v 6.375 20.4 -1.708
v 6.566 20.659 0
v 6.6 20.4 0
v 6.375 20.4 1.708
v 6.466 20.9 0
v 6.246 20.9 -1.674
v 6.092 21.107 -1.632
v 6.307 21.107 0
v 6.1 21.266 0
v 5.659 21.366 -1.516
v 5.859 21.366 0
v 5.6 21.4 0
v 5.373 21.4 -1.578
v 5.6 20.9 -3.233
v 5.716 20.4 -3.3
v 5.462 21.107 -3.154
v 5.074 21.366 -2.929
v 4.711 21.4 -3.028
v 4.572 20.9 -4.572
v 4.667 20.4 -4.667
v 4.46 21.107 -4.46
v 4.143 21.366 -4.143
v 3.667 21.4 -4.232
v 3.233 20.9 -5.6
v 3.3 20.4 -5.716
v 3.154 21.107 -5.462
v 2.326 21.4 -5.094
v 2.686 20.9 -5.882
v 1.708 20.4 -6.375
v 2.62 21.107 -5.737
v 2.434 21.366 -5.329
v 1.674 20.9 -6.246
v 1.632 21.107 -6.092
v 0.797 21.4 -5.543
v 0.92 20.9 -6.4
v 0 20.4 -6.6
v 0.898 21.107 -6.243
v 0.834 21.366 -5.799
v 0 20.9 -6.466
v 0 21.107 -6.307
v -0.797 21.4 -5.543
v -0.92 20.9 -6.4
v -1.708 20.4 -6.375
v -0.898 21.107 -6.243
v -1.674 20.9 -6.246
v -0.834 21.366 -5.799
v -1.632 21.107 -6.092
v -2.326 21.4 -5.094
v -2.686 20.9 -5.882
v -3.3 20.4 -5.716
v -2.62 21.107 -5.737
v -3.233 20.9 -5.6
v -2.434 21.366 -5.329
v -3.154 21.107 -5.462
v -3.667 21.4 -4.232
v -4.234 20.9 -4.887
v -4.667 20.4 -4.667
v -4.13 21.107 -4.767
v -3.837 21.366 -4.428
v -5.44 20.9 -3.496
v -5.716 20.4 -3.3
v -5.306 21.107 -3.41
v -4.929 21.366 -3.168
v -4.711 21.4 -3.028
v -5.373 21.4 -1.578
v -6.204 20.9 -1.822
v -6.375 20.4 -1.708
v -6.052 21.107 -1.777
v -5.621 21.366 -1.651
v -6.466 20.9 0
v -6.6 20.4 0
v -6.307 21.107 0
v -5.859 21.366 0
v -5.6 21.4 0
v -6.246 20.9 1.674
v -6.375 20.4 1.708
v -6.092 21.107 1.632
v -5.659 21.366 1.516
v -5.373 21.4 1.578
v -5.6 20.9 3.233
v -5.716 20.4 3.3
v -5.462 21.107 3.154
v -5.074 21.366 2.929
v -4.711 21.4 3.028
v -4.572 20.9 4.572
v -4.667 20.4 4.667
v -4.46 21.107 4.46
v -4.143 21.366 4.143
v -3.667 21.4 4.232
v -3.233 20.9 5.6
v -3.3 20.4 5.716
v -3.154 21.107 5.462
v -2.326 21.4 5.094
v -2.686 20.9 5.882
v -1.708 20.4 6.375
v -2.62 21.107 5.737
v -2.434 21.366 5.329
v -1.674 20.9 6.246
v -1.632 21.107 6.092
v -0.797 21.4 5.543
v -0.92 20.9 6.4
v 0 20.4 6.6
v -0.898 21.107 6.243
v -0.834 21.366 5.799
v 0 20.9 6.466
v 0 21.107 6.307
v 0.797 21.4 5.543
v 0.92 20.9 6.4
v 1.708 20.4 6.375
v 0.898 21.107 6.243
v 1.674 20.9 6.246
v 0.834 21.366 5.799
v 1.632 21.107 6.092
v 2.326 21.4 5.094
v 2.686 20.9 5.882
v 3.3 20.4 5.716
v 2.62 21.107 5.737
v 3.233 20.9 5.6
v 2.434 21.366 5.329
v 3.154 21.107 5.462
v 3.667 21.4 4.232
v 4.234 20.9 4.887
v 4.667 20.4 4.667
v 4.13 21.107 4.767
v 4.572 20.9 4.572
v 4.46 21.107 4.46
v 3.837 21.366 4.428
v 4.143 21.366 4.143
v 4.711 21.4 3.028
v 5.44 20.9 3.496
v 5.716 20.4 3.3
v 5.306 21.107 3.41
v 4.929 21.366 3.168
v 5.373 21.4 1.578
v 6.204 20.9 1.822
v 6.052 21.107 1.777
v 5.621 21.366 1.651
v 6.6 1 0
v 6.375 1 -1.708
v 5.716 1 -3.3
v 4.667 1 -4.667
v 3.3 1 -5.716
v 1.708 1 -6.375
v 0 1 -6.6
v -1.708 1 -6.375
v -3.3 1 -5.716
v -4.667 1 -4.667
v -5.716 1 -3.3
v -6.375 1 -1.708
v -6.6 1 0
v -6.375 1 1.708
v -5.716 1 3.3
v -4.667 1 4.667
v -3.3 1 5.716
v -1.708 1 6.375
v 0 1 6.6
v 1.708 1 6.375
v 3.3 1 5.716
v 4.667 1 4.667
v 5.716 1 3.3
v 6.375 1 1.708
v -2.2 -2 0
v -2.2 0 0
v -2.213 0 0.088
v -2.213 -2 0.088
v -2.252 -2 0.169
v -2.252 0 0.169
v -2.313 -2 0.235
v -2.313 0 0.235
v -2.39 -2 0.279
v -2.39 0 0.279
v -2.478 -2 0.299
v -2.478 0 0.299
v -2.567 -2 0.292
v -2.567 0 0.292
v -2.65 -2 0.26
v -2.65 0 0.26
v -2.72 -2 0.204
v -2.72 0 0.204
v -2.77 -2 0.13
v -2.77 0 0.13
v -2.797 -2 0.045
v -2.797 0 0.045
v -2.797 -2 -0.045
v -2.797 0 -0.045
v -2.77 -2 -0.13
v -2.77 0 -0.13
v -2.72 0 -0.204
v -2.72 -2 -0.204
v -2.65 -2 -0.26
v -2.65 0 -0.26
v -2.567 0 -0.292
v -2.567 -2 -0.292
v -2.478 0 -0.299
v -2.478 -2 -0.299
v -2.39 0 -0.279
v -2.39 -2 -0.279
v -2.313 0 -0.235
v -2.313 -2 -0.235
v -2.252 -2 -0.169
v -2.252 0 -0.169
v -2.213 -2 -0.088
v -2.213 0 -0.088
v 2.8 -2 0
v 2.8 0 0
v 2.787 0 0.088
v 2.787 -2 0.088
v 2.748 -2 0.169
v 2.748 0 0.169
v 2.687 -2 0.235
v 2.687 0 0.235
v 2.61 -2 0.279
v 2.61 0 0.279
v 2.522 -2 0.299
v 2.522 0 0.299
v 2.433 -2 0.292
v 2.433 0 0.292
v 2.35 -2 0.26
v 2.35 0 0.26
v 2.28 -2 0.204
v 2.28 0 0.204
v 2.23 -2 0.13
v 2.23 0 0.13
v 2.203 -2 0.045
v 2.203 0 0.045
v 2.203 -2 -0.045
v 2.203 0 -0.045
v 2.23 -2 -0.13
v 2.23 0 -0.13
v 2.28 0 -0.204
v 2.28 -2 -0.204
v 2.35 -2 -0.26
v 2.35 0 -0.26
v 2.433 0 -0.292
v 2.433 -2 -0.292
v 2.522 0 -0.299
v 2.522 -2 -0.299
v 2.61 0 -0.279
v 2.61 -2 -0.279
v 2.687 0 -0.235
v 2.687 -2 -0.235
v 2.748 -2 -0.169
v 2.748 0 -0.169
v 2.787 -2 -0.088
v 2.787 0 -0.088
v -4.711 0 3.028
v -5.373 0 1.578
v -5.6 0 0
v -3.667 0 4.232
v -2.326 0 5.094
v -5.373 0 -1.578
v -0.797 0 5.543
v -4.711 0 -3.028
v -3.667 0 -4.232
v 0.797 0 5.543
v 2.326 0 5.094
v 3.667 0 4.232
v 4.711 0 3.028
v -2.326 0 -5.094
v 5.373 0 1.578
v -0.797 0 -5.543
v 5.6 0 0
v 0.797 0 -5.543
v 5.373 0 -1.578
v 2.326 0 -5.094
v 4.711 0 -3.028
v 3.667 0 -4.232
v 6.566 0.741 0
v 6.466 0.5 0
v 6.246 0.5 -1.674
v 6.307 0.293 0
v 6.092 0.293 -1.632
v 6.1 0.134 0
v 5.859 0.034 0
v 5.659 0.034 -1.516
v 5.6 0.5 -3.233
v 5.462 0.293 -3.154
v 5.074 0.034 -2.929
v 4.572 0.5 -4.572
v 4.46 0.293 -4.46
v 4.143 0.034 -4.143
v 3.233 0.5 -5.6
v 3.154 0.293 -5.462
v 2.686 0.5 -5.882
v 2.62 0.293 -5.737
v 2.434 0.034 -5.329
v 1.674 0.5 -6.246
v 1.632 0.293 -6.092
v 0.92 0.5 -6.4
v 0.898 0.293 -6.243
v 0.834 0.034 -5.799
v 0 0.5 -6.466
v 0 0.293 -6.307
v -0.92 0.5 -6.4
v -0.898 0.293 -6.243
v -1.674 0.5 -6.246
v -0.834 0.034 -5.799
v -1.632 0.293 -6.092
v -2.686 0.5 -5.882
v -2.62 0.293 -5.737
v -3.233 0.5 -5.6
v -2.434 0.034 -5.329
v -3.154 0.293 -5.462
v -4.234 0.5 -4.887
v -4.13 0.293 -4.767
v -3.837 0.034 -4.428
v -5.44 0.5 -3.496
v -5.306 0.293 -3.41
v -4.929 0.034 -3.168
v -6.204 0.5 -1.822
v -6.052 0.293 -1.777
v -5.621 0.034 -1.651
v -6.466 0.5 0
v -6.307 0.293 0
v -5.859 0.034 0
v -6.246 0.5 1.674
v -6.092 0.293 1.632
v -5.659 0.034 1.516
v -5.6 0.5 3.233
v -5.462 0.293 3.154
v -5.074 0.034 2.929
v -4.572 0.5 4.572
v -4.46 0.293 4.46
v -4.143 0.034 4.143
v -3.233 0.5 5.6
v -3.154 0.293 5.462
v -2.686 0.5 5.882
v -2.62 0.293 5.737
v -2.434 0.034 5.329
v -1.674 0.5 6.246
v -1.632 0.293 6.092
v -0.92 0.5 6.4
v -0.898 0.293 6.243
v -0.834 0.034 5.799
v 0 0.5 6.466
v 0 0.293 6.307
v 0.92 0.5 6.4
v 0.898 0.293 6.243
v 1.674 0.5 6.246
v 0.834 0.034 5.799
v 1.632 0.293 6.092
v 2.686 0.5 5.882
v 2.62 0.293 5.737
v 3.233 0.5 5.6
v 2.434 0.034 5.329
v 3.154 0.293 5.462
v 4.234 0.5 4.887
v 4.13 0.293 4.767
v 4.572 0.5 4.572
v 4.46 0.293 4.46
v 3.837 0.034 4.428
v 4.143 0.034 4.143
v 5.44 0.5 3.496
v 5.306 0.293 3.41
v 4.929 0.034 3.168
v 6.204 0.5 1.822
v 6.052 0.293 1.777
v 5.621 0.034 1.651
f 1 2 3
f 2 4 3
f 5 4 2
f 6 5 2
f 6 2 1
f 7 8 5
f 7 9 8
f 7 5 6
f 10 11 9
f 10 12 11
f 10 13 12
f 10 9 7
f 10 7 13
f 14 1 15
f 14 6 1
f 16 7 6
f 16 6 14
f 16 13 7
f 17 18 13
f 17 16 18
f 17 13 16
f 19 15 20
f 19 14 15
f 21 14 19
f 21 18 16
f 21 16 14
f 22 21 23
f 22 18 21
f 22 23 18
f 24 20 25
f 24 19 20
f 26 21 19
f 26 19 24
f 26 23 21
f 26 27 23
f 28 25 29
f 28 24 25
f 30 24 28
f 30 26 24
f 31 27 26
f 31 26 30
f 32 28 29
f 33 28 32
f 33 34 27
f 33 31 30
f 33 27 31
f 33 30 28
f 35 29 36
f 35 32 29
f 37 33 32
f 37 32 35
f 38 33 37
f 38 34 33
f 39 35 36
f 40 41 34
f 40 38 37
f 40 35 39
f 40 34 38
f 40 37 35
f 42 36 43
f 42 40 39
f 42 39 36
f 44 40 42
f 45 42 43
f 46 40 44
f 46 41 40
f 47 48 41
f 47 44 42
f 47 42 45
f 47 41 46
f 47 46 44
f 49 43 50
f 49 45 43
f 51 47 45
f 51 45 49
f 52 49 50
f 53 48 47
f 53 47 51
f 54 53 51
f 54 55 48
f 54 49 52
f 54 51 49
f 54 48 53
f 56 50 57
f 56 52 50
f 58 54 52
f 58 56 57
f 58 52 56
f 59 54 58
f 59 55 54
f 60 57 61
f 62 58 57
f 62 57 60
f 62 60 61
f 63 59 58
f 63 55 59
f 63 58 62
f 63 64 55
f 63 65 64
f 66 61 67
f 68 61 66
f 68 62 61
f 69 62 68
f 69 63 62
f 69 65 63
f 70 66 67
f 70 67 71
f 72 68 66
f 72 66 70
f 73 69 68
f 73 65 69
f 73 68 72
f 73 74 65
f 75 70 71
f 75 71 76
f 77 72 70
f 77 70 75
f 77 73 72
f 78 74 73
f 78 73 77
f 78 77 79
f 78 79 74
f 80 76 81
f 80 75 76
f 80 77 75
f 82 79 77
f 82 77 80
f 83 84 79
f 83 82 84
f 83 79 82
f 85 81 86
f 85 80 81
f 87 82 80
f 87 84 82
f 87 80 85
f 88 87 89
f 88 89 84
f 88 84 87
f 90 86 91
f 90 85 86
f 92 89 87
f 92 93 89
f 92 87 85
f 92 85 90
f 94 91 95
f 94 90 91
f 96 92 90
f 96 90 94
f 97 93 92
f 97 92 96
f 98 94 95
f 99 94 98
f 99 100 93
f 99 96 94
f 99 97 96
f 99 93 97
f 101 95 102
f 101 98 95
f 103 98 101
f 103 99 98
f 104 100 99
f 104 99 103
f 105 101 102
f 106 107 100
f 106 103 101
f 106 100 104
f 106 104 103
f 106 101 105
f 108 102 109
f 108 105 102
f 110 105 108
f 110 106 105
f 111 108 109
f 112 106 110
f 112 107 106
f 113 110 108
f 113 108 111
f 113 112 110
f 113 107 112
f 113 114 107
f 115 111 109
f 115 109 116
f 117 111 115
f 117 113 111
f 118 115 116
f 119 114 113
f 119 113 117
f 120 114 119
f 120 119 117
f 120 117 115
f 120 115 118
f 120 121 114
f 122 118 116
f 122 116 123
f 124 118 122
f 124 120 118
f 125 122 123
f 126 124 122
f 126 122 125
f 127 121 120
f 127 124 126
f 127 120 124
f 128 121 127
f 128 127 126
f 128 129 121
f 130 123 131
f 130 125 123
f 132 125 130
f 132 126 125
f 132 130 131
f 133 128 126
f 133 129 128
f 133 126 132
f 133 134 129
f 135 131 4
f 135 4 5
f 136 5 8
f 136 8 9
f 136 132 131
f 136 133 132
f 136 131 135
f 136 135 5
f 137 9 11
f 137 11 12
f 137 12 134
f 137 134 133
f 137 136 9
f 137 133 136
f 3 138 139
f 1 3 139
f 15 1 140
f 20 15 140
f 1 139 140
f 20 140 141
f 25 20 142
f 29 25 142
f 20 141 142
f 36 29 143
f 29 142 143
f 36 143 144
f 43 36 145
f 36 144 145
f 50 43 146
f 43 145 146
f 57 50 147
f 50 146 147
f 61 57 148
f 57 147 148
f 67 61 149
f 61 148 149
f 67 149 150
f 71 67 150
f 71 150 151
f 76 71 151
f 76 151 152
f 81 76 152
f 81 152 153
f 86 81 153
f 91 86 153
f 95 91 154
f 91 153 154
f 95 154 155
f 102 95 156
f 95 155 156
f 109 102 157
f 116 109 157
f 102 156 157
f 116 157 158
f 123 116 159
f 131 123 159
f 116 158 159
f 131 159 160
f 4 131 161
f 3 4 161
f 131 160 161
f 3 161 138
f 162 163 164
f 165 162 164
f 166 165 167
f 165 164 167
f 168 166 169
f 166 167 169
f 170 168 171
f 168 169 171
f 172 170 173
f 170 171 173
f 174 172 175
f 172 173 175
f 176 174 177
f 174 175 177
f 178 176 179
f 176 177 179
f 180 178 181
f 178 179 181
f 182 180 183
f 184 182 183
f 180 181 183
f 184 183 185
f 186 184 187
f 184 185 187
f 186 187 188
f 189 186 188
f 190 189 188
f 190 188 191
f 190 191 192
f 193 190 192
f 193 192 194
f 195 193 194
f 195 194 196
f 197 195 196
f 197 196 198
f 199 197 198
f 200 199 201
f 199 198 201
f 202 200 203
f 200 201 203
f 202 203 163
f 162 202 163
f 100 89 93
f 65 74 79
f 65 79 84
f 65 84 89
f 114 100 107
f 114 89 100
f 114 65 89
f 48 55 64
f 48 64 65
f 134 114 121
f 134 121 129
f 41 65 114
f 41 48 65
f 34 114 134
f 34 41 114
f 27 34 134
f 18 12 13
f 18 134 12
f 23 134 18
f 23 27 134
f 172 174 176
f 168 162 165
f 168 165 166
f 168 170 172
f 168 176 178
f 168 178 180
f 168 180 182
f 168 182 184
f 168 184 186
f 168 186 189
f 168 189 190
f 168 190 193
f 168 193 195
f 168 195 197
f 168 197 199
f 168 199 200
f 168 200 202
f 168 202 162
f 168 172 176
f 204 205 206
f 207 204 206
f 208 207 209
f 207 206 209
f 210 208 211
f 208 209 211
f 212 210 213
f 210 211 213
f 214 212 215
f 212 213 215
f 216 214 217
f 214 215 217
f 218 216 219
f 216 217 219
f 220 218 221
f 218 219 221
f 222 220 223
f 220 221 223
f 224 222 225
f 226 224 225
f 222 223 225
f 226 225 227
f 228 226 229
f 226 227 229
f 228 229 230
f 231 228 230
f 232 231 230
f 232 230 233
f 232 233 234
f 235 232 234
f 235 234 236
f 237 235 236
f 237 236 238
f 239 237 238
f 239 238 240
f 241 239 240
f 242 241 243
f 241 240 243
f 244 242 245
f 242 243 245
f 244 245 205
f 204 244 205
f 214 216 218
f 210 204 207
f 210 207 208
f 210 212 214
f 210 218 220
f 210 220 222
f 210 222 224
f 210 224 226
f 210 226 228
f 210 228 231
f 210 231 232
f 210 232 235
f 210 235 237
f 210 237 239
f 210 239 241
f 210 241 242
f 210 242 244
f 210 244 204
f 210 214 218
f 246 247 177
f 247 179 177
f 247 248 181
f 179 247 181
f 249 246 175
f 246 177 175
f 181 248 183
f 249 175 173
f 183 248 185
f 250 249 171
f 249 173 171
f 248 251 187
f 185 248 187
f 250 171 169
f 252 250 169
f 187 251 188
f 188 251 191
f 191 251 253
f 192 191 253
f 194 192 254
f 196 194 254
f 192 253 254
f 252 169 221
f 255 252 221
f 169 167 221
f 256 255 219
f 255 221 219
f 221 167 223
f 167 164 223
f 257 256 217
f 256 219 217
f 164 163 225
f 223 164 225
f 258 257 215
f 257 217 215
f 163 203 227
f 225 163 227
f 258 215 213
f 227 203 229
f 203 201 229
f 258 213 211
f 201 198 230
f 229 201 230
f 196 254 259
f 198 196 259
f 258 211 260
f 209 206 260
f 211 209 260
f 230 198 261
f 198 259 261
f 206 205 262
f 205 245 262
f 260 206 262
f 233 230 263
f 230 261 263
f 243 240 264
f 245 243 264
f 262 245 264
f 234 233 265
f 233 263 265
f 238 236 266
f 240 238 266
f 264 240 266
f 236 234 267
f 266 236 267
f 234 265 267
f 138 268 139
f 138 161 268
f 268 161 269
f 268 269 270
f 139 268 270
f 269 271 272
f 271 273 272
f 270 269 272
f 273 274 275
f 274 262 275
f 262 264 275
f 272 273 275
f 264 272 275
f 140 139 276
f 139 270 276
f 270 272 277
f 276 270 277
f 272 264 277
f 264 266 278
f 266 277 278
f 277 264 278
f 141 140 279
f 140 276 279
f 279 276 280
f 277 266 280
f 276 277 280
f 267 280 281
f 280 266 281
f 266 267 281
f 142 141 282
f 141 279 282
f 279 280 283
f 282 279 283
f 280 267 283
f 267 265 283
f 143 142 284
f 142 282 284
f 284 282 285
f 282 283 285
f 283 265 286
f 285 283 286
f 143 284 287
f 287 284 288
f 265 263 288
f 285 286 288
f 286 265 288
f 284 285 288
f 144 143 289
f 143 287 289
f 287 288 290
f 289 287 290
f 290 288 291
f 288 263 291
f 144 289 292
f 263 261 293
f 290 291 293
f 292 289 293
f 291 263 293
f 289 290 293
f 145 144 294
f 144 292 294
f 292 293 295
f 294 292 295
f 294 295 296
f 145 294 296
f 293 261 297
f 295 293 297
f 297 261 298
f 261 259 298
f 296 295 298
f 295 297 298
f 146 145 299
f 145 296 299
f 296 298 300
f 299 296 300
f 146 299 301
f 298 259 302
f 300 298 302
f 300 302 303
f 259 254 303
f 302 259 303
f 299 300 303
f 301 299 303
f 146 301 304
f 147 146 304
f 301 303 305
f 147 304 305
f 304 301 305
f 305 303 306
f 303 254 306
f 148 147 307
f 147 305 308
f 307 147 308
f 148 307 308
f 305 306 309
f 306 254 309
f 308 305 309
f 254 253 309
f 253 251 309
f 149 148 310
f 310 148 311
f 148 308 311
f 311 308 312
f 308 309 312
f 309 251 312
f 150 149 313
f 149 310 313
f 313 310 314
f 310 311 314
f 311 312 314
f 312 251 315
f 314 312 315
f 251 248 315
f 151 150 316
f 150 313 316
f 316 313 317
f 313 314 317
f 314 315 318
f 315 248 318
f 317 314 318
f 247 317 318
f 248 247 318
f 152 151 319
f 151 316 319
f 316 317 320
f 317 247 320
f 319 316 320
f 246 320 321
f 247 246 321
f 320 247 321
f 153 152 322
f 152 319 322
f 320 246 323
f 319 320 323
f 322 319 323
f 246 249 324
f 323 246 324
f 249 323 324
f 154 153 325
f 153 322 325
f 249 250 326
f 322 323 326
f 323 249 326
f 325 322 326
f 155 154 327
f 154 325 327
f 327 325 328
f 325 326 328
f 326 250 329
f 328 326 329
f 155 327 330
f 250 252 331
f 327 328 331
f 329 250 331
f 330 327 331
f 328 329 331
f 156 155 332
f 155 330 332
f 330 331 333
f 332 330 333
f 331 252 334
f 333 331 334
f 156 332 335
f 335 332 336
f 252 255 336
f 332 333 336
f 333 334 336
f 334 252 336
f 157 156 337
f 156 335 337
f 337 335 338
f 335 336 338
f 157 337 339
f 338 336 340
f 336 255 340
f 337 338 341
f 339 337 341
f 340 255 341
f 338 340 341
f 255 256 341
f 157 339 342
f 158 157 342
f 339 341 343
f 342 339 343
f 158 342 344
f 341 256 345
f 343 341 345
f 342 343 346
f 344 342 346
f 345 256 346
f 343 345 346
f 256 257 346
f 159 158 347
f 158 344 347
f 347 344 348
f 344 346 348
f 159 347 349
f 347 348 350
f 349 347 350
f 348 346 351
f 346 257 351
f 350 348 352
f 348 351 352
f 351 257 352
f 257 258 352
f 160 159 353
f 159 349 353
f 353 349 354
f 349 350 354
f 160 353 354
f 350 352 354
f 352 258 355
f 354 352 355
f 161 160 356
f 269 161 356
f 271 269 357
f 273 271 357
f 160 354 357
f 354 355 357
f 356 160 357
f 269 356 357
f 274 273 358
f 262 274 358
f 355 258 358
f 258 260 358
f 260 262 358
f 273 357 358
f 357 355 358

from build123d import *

# Parameters (mm, degrees)
SKETCH1_R           = 6.6
BOSS_EXTRUDE1_DEPTH = 21.4
FILLET1_R           = 1
SKETCH2_R           = 0.3
BOSS_EXTRUDE2_DEPTH = 2


with BuildPart() as part:
    # Sketch1 → Boss-Extrude1 (new body)
    with BuildSketch(Plane(origin=(0, 0, 0), x_dir=(1, 0, 0), z_dir=(0, 1, 0))):
        Circle(SKETCH1_R)
    extrude(amount=BOSS_EXTRUDE1_DEPTH)

    # Fillet1
    fillet1_edges = [part.edges().sort_by_distance(p)[0] for p in [
        (-6.6, 0, 0),
        (-6.6, 21.4, 0),
    ]]
    fillet(fillet1_edges, radius=FILLET1_R)

    # Sketch2 → Boss-Extrude2 (add)
    with BuildSketch(Plane.XZ):
        with Locations((-2.5, 0)):
            Circle(SKETCH2_R)
        with Locations((2.5, 0)):
            Circle(SKETCH2_R)
    extrude(amount=BOSS_EXTRUDE2_DEPTH)


solid = part.part
